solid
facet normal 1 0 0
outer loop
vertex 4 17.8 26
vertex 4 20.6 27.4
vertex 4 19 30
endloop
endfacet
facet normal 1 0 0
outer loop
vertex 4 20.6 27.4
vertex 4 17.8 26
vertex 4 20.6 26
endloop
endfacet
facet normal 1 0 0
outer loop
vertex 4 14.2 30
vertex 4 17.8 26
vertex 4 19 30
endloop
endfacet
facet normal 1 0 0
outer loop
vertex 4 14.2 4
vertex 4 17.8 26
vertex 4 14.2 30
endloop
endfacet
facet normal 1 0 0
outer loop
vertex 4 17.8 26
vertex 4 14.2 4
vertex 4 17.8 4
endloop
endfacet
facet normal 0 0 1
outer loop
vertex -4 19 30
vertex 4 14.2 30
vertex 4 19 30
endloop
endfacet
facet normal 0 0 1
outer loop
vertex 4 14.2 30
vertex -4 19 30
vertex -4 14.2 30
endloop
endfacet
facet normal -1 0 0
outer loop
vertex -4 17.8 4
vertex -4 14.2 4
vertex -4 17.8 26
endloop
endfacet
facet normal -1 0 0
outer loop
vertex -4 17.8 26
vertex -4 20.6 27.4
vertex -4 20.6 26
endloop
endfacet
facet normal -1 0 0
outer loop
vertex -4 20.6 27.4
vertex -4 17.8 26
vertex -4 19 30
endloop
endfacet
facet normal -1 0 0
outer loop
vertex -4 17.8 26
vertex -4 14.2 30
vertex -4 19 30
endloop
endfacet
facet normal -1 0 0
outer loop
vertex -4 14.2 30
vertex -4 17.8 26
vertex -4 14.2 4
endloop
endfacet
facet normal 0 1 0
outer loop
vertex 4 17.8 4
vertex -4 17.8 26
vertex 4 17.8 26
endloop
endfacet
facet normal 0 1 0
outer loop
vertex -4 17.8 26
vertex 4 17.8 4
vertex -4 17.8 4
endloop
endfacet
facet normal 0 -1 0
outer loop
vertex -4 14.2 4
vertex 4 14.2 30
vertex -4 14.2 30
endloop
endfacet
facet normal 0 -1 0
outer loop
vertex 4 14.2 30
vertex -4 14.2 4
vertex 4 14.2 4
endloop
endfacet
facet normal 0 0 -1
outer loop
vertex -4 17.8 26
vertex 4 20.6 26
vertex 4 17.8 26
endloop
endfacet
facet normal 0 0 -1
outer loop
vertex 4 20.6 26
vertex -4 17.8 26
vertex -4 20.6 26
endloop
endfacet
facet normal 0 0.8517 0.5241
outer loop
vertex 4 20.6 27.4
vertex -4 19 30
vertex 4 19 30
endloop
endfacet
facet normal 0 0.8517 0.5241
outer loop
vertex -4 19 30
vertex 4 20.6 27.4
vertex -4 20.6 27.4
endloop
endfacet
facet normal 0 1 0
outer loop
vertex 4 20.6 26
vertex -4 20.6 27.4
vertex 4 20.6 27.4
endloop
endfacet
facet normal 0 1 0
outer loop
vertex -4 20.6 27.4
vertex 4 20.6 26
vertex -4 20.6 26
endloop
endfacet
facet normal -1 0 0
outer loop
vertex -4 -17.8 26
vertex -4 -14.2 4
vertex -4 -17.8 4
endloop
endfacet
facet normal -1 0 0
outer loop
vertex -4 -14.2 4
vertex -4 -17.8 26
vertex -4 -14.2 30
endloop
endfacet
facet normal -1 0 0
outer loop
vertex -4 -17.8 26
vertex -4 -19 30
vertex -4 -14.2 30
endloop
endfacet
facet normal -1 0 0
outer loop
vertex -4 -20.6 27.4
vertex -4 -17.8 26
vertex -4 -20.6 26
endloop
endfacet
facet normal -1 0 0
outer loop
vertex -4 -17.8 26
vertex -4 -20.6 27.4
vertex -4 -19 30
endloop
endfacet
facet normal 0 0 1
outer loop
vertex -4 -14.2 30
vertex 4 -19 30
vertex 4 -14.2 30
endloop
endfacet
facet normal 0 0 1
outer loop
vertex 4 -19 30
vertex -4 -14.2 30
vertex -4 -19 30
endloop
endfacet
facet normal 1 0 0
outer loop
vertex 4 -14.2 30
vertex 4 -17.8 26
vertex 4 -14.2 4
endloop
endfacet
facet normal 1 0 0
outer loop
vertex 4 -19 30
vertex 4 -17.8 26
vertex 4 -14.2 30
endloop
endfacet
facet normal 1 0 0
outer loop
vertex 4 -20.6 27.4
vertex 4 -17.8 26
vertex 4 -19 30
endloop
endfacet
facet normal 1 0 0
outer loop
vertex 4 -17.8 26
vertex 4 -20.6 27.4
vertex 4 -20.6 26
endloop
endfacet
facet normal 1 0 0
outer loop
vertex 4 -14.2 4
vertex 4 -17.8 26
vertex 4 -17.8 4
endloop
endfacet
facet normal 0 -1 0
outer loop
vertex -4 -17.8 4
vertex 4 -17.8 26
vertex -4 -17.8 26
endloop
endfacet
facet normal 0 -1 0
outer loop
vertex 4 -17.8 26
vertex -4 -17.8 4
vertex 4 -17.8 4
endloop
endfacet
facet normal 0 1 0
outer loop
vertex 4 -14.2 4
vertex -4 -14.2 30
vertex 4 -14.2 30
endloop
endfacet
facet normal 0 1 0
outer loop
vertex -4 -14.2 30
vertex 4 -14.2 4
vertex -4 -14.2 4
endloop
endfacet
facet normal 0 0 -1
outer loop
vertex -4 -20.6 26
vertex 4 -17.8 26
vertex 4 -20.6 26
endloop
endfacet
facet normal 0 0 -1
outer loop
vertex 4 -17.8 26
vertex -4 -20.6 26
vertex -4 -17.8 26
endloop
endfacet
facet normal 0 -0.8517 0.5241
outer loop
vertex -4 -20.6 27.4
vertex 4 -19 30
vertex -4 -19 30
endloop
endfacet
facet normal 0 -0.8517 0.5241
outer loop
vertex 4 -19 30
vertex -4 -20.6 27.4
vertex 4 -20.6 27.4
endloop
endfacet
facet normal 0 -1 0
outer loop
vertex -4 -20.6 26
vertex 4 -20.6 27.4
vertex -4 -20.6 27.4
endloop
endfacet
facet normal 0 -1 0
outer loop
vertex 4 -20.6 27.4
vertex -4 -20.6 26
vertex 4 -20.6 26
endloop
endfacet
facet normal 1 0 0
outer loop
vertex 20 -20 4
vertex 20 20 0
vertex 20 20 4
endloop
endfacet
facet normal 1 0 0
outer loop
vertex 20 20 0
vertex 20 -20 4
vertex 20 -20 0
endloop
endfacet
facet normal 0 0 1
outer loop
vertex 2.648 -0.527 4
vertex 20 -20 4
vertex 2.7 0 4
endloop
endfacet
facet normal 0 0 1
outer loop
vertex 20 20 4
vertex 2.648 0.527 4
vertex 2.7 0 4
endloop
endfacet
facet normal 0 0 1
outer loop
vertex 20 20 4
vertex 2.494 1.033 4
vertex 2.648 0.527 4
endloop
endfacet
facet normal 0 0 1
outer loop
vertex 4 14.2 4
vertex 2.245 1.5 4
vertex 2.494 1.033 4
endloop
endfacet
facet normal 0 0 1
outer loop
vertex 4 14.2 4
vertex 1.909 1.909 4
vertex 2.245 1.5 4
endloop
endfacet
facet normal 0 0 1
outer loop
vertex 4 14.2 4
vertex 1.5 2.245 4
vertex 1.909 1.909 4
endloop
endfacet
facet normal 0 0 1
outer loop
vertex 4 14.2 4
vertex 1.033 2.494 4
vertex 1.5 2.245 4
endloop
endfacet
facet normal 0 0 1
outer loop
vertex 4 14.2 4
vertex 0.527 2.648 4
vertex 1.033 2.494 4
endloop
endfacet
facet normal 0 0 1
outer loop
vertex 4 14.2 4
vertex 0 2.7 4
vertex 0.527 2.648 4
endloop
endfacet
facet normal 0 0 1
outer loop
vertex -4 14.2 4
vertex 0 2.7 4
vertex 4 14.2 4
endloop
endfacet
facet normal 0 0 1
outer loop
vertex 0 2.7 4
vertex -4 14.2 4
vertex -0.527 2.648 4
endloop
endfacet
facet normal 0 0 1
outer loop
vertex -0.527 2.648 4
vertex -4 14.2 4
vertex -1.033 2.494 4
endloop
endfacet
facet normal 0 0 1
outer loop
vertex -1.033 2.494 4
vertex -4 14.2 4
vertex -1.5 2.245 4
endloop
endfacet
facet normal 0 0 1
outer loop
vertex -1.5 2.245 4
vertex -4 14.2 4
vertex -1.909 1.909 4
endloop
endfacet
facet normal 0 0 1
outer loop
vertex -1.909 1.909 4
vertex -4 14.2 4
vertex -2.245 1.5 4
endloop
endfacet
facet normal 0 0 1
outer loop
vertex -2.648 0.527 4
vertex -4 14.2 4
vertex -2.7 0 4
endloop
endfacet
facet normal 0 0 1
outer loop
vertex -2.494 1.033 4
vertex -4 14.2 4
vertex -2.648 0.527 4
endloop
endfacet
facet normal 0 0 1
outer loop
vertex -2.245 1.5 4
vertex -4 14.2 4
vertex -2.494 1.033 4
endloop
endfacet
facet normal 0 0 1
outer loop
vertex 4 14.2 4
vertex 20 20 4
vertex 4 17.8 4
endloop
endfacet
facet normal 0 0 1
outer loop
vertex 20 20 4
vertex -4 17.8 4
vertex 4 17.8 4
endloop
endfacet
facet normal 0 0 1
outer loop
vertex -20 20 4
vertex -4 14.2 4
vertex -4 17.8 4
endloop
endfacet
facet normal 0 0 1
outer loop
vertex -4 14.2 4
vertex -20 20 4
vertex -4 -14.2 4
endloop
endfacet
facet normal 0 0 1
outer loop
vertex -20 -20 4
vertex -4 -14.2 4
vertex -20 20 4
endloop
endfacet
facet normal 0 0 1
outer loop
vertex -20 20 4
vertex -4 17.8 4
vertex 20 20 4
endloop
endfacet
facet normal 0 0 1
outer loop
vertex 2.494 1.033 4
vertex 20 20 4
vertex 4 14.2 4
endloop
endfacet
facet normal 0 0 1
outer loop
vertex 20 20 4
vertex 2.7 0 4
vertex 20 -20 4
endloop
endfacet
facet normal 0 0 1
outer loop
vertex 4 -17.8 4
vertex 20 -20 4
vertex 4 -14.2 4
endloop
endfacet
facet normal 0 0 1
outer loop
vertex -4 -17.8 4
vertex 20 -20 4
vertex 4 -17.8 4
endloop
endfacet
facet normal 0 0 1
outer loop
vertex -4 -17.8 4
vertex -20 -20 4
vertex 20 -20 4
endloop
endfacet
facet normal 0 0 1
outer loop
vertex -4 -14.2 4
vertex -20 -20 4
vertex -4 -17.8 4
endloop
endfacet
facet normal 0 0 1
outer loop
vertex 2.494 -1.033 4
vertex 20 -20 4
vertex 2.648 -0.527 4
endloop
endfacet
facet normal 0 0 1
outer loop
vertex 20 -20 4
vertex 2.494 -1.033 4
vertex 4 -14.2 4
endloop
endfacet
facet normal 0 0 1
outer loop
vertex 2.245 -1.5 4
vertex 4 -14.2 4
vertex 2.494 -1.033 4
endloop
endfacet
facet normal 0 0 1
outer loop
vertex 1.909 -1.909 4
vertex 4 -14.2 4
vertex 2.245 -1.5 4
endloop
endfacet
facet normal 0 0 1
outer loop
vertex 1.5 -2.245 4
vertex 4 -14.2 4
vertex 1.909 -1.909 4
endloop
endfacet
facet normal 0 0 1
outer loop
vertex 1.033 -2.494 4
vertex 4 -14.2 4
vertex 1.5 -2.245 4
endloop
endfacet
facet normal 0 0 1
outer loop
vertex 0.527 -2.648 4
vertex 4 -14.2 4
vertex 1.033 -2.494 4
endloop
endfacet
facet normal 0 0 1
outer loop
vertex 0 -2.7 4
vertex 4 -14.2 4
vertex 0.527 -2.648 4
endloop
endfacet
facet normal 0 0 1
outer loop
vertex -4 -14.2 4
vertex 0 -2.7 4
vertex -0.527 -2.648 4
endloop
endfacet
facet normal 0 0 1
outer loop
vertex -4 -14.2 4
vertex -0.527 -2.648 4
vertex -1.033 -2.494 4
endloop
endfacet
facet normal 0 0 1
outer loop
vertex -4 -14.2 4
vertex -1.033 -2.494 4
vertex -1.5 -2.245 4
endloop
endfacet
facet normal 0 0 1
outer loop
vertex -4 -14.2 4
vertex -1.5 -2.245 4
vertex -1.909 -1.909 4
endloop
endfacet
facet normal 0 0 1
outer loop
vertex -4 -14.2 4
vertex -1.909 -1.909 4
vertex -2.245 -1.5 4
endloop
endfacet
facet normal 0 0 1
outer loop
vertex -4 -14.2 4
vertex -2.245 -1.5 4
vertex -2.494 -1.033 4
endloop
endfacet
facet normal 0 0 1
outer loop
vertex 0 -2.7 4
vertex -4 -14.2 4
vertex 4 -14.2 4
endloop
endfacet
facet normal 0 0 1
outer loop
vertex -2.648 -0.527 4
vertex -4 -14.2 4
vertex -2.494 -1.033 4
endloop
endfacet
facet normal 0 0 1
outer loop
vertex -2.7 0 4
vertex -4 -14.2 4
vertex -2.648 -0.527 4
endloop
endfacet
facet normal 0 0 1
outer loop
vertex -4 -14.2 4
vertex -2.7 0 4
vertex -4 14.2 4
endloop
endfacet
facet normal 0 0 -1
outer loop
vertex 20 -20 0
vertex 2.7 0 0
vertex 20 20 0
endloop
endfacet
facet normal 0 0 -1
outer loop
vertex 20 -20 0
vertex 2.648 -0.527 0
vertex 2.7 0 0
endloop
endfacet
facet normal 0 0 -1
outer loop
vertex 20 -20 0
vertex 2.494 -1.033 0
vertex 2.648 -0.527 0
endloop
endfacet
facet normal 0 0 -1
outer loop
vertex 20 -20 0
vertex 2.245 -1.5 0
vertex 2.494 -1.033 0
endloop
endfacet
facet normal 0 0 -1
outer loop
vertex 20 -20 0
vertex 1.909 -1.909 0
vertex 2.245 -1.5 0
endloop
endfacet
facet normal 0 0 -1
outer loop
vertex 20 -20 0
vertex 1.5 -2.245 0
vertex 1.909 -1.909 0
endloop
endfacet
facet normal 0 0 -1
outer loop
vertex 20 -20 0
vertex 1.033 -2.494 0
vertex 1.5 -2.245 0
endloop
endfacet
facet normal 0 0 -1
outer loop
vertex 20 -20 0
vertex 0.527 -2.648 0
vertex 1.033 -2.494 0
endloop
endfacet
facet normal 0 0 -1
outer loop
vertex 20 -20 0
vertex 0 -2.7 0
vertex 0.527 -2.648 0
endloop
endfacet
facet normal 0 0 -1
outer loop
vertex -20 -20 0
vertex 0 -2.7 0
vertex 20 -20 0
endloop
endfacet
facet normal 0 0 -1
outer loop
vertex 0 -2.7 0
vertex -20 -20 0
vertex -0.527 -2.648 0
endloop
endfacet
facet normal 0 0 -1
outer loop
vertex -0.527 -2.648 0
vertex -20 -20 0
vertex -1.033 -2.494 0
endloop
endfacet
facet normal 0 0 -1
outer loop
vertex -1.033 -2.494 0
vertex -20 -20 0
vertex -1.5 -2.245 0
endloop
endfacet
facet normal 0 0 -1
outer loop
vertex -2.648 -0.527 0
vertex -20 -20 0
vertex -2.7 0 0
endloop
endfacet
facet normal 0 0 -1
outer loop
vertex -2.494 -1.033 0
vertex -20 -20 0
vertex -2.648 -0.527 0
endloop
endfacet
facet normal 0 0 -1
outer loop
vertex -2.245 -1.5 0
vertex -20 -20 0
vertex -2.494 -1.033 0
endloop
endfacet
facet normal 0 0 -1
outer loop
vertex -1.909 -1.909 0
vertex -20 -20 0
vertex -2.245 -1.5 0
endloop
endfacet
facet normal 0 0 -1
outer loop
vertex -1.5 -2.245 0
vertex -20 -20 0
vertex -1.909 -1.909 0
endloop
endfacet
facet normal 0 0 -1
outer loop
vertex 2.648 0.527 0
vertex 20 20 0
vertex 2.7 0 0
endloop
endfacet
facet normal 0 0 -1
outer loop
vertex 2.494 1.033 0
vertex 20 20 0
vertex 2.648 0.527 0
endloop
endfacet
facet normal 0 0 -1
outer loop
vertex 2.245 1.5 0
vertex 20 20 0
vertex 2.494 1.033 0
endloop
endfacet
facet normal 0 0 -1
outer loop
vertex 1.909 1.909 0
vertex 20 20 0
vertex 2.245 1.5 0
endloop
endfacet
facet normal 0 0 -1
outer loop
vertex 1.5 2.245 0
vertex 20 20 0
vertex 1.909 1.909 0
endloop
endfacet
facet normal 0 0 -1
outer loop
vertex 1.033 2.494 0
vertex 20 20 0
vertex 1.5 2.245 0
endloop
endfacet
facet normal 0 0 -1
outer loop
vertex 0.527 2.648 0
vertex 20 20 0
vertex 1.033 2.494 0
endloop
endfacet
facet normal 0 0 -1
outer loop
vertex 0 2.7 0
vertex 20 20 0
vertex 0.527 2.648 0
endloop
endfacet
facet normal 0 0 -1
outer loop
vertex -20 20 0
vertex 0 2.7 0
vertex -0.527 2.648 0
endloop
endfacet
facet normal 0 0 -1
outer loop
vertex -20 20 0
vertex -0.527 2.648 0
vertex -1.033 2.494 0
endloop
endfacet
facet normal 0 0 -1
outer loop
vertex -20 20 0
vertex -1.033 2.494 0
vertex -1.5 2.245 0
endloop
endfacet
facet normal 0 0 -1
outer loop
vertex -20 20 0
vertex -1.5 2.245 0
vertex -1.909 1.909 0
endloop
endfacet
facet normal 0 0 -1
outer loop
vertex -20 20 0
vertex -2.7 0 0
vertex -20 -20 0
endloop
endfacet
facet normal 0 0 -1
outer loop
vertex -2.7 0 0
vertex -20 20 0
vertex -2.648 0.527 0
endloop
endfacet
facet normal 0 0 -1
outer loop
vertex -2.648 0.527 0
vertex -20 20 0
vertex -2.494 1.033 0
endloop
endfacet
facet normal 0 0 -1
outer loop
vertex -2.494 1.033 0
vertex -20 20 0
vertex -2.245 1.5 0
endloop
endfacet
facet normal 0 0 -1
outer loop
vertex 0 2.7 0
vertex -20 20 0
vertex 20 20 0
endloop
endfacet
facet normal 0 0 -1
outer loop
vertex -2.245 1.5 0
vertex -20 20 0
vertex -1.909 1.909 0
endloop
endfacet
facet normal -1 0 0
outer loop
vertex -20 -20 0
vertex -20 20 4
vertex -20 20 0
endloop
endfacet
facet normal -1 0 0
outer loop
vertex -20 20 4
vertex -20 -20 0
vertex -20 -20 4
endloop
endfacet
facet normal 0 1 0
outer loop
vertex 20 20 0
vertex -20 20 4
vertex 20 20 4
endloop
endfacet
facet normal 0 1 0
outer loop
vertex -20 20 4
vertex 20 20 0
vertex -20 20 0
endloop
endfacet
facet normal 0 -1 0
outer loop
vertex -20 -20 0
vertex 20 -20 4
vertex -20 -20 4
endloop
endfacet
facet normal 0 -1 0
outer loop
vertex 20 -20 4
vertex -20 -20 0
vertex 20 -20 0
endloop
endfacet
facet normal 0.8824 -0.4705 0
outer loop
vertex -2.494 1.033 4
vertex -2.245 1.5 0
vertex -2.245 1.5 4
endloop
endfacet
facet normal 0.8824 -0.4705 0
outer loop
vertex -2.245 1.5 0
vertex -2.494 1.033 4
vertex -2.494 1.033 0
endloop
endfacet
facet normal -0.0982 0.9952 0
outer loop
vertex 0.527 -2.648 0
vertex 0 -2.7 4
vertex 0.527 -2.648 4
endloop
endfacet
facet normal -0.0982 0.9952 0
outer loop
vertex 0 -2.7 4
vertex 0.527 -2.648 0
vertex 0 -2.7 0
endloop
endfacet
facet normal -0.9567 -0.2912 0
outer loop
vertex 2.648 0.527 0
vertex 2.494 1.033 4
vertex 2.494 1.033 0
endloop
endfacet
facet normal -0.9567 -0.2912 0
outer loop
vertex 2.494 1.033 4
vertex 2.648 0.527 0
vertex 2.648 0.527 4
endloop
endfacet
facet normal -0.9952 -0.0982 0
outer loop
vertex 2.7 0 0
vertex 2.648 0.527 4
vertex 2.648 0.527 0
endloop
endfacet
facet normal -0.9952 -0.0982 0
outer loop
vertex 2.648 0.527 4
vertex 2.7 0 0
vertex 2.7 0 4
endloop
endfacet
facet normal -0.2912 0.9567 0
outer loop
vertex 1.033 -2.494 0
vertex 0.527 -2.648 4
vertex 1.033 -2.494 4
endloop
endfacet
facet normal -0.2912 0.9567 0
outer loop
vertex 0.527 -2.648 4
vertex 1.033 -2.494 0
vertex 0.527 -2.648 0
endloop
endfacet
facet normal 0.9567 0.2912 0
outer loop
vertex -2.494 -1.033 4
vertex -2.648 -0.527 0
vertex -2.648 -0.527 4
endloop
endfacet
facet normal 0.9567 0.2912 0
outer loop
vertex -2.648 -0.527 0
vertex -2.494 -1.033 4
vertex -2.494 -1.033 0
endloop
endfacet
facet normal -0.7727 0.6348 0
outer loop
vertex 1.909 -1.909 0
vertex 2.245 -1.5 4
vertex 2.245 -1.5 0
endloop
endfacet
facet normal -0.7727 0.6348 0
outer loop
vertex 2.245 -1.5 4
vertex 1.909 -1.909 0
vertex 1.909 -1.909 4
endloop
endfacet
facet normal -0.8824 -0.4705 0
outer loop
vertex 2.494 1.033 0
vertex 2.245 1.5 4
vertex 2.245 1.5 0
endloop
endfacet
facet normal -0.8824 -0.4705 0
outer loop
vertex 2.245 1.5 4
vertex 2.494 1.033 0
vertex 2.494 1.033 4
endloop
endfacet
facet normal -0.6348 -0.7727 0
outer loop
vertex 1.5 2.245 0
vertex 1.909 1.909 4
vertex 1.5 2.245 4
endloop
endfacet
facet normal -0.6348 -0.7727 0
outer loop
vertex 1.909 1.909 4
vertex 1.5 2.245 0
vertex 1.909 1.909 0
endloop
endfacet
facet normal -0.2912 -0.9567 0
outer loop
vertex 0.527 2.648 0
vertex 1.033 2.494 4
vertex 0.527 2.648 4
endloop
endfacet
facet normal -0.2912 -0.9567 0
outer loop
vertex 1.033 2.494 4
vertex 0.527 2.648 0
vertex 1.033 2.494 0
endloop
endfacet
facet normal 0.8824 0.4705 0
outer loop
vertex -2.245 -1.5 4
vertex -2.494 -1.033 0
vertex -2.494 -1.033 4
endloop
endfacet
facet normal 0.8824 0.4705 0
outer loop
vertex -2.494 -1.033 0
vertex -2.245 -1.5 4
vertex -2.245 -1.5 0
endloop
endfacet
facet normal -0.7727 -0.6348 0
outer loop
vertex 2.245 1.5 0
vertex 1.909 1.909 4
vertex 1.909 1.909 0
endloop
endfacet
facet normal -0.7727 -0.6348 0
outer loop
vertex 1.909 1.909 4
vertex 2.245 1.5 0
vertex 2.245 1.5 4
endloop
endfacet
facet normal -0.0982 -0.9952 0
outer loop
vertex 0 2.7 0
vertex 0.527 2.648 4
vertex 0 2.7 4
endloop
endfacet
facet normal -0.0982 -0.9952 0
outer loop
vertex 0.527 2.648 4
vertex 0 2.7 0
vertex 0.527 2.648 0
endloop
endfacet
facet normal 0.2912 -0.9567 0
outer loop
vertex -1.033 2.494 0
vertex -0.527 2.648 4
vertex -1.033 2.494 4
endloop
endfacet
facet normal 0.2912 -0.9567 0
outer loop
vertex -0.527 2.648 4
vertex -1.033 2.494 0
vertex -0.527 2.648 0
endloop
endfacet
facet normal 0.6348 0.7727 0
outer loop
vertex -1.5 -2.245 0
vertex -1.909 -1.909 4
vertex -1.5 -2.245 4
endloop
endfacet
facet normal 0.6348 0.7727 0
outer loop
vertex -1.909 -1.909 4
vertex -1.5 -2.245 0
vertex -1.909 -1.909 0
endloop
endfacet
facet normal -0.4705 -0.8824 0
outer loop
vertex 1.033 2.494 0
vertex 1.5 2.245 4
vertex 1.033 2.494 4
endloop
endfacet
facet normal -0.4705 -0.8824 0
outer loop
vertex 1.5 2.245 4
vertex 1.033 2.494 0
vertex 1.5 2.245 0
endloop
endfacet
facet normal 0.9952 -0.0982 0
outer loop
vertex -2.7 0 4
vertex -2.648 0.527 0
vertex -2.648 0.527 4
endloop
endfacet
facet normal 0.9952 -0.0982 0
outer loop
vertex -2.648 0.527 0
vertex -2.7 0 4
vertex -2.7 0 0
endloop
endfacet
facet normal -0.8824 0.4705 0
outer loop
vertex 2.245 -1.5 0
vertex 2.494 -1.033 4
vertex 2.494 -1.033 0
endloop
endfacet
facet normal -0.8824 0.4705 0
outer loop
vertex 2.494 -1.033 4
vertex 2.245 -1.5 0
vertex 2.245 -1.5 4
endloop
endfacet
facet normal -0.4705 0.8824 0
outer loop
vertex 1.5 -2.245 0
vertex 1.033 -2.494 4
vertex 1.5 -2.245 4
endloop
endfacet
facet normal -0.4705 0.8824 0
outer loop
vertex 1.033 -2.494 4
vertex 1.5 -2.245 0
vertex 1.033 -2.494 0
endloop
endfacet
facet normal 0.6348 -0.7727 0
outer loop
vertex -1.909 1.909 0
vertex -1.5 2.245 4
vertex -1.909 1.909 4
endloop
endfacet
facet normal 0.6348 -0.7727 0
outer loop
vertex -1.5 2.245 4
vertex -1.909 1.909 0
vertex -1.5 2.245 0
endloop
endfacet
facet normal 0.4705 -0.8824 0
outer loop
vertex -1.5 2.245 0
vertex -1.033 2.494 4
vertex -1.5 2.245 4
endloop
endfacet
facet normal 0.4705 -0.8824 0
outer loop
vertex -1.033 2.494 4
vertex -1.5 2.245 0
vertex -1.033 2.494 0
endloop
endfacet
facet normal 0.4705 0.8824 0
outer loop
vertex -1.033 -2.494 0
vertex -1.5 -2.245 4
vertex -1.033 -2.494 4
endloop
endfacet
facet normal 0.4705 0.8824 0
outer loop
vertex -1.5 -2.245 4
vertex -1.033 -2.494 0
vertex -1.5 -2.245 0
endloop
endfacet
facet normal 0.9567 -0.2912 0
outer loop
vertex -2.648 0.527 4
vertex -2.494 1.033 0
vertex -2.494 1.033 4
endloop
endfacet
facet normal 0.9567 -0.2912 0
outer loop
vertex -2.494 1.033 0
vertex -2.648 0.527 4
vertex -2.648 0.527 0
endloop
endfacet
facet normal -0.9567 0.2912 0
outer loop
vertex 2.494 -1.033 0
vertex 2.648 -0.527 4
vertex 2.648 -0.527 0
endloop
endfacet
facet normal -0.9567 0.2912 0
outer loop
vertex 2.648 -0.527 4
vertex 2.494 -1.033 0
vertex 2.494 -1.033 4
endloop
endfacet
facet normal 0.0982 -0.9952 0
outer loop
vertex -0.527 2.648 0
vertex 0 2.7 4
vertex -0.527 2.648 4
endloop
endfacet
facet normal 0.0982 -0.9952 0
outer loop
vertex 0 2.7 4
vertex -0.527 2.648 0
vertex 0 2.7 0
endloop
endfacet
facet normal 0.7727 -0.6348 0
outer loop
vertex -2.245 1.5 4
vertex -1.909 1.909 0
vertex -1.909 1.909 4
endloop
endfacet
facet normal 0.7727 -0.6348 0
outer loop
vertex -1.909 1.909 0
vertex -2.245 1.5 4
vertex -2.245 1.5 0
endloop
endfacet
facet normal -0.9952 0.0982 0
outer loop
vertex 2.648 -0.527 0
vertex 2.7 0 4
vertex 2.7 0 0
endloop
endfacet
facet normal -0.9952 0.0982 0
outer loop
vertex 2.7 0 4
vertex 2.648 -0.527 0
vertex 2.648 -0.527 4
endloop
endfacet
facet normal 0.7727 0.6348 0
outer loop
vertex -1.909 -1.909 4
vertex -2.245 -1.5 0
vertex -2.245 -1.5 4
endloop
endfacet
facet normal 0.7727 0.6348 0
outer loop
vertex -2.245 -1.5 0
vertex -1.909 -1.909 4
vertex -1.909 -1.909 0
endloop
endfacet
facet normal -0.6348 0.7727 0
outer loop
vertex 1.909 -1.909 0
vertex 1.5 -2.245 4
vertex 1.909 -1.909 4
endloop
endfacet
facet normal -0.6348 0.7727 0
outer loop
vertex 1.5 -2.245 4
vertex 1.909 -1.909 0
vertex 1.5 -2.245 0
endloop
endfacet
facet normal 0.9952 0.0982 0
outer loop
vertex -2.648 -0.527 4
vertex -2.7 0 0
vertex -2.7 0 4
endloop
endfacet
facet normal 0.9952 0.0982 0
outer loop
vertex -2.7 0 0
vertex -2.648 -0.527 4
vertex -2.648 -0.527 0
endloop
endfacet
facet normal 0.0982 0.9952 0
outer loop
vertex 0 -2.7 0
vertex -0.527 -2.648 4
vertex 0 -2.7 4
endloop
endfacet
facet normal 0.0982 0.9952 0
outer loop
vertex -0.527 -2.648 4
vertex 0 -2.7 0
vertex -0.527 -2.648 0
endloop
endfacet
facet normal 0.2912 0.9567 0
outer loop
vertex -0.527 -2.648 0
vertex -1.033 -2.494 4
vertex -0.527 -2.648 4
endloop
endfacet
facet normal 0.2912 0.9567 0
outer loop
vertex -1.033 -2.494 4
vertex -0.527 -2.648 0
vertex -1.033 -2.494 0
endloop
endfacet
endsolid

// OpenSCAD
$fn = 32;

// ----------------------------------------------------------------------
// Snap-fit latch: 2 arms, 26 mm tall, 3 mm undercut hooks
// ----------------------------------------------------------------------

// --- parameters (mm) ---
base_d = 40;              // base plate depth
base_h = 4;               // base plate thickness
span = 32;                // distance between opposite arms
arm_t = 3.6;              // arm thickness
arm_d = 8;                // arm width
height = 26;              // free arm length
head_len = 3;             // hook reach
head_h = 4;               // hook height
lead = 1.4;               // lead-in ramp thickness
bore_d = 5.4;             // base fixing bore
top_z = 30;               // height of the arm tips above the base

arms = 2;

difference() {
  union() {
    /* base plate, centred on the arm ring */
    translate([-20, -20, 0]) cube([base_d, base_d, base_h]);
    for (a = [0 : 360 / arms : 359]) rotate([0, 0, a]) {
    /* arm, sunk 0.5 mm into the base */
    translate([-arm_d / 2, span / 2 - arm_t / 2, base_h - 0.5]) cube([arm_d, arm_t, height + 0.5]);
    /* hook: a convex hull of a tall inner block and a thin outer lip
       gives a flat undercut below and a lead-in ramp on top */
    hull() {
      translate([-arm_d / 2, span / 2 + arm_t / 2 - 0.6, top_z - head_h]) cube([arm_d, lead + 0.4, head_h]);
      translate([-arm_d / 2, span / 2 + arm_t / 2 - 0.2, top_z - head_h]) cube([arm_d, head_len, lead]);
    }
    }
  }
  translate([0, 0, -2.5]) cylinder(h = base_h + 5, d = bore_d);
}
